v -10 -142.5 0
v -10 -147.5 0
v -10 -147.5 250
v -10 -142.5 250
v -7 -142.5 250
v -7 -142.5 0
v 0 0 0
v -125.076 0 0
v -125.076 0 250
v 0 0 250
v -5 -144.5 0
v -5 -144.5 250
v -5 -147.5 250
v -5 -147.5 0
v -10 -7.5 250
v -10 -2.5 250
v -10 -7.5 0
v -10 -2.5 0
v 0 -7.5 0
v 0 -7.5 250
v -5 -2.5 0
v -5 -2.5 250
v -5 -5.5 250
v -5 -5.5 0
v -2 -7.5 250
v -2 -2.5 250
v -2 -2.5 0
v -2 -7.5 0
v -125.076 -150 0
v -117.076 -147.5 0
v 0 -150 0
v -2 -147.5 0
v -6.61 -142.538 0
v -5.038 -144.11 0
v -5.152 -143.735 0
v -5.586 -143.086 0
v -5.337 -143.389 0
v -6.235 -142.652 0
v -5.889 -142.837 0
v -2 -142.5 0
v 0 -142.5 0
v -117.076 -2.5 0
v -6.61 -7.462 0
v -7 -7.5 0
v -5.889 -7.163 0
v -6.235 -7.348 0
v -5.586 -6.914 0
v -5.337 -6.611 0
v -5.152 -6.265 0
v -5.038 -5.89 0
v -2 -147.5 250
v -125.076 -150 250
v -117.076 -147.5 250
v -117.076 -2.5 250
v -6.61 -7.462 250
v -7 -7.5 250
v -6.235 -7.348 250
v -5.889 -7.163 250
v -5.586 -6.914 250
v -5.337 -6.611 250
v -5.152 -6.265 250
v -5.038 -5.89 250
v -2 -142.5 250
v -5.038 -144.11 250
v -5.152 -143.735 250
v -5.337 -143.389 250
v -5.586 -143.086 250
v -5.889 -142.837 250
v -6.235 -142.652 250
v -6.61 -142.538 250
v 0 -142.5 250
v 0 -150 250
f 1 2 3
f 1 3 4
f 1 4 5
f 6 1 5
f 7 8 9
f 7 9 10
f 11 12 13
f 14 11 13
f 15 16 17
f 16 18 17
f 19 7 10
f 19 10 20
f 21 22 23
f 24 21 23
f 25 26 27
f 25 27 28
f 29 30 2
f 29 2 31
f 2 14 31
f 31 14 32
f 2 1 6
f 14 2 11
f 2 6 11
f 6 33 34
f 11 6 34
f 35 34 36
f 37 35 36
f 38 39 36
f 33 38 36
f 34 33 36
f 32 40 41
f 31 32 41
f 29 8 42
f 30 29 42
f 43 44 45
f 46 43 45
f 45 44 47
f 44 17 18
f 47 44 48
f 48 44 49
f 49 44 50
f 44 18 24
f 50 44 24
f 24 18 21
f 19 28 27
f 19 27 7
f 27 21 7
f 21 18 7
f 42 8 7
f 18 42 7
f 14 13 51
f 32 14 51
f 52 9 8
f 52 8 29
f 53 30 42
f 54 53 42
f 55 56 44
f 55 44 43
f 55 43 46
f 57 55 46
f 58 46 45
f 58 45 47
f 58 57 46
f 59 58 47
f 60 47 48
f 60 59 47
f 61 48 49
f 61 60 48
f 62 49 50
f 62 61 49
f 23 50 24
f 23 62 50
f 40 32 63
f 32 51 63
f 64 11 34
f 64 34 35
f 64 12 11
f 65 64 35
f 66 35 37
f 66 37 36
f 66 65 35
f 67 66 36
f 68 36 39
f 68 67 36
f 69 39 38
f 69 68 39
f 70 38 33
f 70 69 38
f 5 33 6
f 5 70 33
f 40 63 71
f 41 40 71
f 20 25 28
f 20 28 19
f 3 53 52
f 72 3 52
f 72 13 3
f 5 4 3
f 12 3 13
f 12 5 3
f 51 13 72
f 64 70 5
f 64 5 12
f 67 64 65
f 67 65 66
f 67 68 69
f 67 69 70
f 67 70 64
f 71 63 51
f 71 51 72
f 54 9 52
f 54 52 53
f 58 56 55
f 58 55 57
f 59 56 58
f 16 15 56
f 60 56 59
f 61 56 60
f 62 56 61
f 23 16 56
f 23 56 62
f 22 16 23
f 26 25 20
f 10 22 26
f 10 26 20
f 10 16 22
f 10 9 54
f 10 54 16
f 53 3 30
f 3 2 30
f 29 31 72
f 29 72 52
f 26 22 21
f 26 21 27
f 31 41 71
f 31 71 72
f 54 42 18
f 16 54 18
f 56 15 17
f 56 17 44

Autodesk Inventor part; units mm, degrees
ref_plane "YZ Plane" through (0, 0, 0) normal (1, 0, 0) x (0, 1, 0)
ref_plane "Work Plane1" through (0, 0, 0) normal (0, 0, 1) x (1, 0, 0)
sketch "Sketch1" plane through (0, 0, 0) normal (0, 0, 1) x (1, 0, 0)
  line L0 (0, -150) -> (-125.0759, -150) projected
  line L1 (0, 0) -> (0, -150) projected
  line L2 (-125.0759, 0) -> (0, 0) projected
  line L3 (-125.0759, 0) -> (-125.0759, -150) projected
  line L4 (-5, -147.5) -> (-117.0759, -147.5) projected
  line L5 (-117.0759, -147.5) -> (-117.0759, -2.5) projected
  line L6 (-117.0759, -2.5) -> (-5, -2.5) projected
  line L7 (-5, -2.5) -> (-5, -147.5) projected
  line L8 (0, -150) -> (-125.0759, -150) projected
  line L9 (0, 0) -> (0, -150) projected
  line L10 (-125.0759, 0) -> (0, 0) projected
  line L11 (-125.0759, 0) -> (-125.0759, -150) projected
  line L12 (-5, -147.5) -> (-117.0759, -147.5) projected
  line L13 (-117.0759, -147.5) -> (-117.0759, -2.5) projected
  line L14 (-117.0759, -2.5) -> (-5, -2.5) projected
  line L15 (-5, -2.5) -> (-5, -147.5) projected
  line L16 (-5, -2.5) -> (0, -2.5)
  line L17 (-5, -147.5) -> (0, -147.5)
  line L18 (-5, -2.5) -> (-10, -2.5)
  line L19 (-10, -2.5) -> (-10, -7.5)
  line L20 (-10, -7.5) -> (-5, -7.5)
  line L21 (-5, -7.5) -> (-5, -2.5)
  line L22 (-5, -147.5) -> (-10, -147.5)
  line L23 (-10, -147.5) -> (-10, -142.5)
  line L24 (-10, -142.5) -> (-5, -142.5)
  line L25 (-5, -142.5) -> (-5, -147.5)
  dimension "d2" = 5
  dimension "d3" = 5
  dimension "d4" = 5
  dimension "d5" = 5
extrude "Extrusion1" add sketch "Sketch1" along normal blind 250 contours L0 L3 L2 L1 L16 L6 L5 L4 L17 | L4 L23 L24 L7 | L7 L20 L19 L6
sketch "Sketch2" plane through (0, 0, 250) normal (0, 0, 1) x (1, 0, 0)
  line L0 (-5, -2.5) -> (-2, -2.5)
  line L1 (-2, -2.5) -> (-2, -7.5)
  line L2 (0, -2.5) -> (-2, -2.5)
  line L3 (-2, -2.5) -> (-2, -7.5)
  line L4 (-2, -7.5) -> (0, -7.5)
  line L5 (0, -7.5) -> (0, -2.5)
  line L6 (-117.0759, -147.5) -> (-117.0759, -2.5) projected
  line L7 (-117.0759, -75) -> (40.0034, -75) construction
  line L8 (-5, -147.5) -> (-2, -147.5)
  line L9 (-2, -147.5) -> (-2, -142.5)
  line L10 (0, -147.5) -> (-2, -147.5)
  line L11 (-2, -147.5) -> (-2, -142.5)
  line L12 (-2, -142.5) -> (0, -142.5)
  line L13 (0, -142.5) -> (0, -147.5)
  point P0 (0, 0)
ref_plane "Work Plane2" through (-125.0759, -150, 0) normal (0, 0, 1) x (1, 0, 0)
extrude "Extrusion2" add sketch "Sketch2" against normal up to surface (250 mm away)
fillet "Fillet1" radius 2 2 edges at (-5, -142.5, 125) (-5, -7.5, 125)
sketch "Sketch3" plane through (0, 0, 250) normal (0, 0, 1) x (1, 0, 0)
  line L0 (0, -7.5) -> (0, 0) projected
  line L1 (0, -7.5) -> (-2, -7.5)
  line L2 (-5, -7.5) -> (-5, -142.5)
  line L3 (-2, -142.5) -> (0, -142.5)
  line L4 (0, -142.5) -> (0, -7.5)
  line L5 (-2, -147.5) -> (-2, -142.5) projected
  line L6 (-2, -147.5) -> (-5, -147.5)
  line L7 (-5, -147.5) -> (-5, -142.5)
  line L8 (-2, -142.5) -> (-2, -147.5)
  line L9 (-5, -2.5) -> (-2, -2.5) projected
  line L10 (-2, -2.5) -> (-5, -2.5)
  line L11 (-5, -2.5) -> (-5, -7.5)
  line L12 (-2, -7.5) -> (-2, -2.5)
  line L13 (-2, -2.5) -> (-2, -7.5) projected
  line L14 (-2, -2.7) -> (-5, -2.7)
  line L15 (-2, -147.3) -> (-5, -147.3)
  dimension "d10" = 0.2
  dimension "d11" = 0.2
ref_plane "Work Plane3" through (-125.0759, -150, 0) normal (0, 0, 1) x (1, 0, 0)
properties part number "ForwardSection1" material "Plastic, Opaque White"
